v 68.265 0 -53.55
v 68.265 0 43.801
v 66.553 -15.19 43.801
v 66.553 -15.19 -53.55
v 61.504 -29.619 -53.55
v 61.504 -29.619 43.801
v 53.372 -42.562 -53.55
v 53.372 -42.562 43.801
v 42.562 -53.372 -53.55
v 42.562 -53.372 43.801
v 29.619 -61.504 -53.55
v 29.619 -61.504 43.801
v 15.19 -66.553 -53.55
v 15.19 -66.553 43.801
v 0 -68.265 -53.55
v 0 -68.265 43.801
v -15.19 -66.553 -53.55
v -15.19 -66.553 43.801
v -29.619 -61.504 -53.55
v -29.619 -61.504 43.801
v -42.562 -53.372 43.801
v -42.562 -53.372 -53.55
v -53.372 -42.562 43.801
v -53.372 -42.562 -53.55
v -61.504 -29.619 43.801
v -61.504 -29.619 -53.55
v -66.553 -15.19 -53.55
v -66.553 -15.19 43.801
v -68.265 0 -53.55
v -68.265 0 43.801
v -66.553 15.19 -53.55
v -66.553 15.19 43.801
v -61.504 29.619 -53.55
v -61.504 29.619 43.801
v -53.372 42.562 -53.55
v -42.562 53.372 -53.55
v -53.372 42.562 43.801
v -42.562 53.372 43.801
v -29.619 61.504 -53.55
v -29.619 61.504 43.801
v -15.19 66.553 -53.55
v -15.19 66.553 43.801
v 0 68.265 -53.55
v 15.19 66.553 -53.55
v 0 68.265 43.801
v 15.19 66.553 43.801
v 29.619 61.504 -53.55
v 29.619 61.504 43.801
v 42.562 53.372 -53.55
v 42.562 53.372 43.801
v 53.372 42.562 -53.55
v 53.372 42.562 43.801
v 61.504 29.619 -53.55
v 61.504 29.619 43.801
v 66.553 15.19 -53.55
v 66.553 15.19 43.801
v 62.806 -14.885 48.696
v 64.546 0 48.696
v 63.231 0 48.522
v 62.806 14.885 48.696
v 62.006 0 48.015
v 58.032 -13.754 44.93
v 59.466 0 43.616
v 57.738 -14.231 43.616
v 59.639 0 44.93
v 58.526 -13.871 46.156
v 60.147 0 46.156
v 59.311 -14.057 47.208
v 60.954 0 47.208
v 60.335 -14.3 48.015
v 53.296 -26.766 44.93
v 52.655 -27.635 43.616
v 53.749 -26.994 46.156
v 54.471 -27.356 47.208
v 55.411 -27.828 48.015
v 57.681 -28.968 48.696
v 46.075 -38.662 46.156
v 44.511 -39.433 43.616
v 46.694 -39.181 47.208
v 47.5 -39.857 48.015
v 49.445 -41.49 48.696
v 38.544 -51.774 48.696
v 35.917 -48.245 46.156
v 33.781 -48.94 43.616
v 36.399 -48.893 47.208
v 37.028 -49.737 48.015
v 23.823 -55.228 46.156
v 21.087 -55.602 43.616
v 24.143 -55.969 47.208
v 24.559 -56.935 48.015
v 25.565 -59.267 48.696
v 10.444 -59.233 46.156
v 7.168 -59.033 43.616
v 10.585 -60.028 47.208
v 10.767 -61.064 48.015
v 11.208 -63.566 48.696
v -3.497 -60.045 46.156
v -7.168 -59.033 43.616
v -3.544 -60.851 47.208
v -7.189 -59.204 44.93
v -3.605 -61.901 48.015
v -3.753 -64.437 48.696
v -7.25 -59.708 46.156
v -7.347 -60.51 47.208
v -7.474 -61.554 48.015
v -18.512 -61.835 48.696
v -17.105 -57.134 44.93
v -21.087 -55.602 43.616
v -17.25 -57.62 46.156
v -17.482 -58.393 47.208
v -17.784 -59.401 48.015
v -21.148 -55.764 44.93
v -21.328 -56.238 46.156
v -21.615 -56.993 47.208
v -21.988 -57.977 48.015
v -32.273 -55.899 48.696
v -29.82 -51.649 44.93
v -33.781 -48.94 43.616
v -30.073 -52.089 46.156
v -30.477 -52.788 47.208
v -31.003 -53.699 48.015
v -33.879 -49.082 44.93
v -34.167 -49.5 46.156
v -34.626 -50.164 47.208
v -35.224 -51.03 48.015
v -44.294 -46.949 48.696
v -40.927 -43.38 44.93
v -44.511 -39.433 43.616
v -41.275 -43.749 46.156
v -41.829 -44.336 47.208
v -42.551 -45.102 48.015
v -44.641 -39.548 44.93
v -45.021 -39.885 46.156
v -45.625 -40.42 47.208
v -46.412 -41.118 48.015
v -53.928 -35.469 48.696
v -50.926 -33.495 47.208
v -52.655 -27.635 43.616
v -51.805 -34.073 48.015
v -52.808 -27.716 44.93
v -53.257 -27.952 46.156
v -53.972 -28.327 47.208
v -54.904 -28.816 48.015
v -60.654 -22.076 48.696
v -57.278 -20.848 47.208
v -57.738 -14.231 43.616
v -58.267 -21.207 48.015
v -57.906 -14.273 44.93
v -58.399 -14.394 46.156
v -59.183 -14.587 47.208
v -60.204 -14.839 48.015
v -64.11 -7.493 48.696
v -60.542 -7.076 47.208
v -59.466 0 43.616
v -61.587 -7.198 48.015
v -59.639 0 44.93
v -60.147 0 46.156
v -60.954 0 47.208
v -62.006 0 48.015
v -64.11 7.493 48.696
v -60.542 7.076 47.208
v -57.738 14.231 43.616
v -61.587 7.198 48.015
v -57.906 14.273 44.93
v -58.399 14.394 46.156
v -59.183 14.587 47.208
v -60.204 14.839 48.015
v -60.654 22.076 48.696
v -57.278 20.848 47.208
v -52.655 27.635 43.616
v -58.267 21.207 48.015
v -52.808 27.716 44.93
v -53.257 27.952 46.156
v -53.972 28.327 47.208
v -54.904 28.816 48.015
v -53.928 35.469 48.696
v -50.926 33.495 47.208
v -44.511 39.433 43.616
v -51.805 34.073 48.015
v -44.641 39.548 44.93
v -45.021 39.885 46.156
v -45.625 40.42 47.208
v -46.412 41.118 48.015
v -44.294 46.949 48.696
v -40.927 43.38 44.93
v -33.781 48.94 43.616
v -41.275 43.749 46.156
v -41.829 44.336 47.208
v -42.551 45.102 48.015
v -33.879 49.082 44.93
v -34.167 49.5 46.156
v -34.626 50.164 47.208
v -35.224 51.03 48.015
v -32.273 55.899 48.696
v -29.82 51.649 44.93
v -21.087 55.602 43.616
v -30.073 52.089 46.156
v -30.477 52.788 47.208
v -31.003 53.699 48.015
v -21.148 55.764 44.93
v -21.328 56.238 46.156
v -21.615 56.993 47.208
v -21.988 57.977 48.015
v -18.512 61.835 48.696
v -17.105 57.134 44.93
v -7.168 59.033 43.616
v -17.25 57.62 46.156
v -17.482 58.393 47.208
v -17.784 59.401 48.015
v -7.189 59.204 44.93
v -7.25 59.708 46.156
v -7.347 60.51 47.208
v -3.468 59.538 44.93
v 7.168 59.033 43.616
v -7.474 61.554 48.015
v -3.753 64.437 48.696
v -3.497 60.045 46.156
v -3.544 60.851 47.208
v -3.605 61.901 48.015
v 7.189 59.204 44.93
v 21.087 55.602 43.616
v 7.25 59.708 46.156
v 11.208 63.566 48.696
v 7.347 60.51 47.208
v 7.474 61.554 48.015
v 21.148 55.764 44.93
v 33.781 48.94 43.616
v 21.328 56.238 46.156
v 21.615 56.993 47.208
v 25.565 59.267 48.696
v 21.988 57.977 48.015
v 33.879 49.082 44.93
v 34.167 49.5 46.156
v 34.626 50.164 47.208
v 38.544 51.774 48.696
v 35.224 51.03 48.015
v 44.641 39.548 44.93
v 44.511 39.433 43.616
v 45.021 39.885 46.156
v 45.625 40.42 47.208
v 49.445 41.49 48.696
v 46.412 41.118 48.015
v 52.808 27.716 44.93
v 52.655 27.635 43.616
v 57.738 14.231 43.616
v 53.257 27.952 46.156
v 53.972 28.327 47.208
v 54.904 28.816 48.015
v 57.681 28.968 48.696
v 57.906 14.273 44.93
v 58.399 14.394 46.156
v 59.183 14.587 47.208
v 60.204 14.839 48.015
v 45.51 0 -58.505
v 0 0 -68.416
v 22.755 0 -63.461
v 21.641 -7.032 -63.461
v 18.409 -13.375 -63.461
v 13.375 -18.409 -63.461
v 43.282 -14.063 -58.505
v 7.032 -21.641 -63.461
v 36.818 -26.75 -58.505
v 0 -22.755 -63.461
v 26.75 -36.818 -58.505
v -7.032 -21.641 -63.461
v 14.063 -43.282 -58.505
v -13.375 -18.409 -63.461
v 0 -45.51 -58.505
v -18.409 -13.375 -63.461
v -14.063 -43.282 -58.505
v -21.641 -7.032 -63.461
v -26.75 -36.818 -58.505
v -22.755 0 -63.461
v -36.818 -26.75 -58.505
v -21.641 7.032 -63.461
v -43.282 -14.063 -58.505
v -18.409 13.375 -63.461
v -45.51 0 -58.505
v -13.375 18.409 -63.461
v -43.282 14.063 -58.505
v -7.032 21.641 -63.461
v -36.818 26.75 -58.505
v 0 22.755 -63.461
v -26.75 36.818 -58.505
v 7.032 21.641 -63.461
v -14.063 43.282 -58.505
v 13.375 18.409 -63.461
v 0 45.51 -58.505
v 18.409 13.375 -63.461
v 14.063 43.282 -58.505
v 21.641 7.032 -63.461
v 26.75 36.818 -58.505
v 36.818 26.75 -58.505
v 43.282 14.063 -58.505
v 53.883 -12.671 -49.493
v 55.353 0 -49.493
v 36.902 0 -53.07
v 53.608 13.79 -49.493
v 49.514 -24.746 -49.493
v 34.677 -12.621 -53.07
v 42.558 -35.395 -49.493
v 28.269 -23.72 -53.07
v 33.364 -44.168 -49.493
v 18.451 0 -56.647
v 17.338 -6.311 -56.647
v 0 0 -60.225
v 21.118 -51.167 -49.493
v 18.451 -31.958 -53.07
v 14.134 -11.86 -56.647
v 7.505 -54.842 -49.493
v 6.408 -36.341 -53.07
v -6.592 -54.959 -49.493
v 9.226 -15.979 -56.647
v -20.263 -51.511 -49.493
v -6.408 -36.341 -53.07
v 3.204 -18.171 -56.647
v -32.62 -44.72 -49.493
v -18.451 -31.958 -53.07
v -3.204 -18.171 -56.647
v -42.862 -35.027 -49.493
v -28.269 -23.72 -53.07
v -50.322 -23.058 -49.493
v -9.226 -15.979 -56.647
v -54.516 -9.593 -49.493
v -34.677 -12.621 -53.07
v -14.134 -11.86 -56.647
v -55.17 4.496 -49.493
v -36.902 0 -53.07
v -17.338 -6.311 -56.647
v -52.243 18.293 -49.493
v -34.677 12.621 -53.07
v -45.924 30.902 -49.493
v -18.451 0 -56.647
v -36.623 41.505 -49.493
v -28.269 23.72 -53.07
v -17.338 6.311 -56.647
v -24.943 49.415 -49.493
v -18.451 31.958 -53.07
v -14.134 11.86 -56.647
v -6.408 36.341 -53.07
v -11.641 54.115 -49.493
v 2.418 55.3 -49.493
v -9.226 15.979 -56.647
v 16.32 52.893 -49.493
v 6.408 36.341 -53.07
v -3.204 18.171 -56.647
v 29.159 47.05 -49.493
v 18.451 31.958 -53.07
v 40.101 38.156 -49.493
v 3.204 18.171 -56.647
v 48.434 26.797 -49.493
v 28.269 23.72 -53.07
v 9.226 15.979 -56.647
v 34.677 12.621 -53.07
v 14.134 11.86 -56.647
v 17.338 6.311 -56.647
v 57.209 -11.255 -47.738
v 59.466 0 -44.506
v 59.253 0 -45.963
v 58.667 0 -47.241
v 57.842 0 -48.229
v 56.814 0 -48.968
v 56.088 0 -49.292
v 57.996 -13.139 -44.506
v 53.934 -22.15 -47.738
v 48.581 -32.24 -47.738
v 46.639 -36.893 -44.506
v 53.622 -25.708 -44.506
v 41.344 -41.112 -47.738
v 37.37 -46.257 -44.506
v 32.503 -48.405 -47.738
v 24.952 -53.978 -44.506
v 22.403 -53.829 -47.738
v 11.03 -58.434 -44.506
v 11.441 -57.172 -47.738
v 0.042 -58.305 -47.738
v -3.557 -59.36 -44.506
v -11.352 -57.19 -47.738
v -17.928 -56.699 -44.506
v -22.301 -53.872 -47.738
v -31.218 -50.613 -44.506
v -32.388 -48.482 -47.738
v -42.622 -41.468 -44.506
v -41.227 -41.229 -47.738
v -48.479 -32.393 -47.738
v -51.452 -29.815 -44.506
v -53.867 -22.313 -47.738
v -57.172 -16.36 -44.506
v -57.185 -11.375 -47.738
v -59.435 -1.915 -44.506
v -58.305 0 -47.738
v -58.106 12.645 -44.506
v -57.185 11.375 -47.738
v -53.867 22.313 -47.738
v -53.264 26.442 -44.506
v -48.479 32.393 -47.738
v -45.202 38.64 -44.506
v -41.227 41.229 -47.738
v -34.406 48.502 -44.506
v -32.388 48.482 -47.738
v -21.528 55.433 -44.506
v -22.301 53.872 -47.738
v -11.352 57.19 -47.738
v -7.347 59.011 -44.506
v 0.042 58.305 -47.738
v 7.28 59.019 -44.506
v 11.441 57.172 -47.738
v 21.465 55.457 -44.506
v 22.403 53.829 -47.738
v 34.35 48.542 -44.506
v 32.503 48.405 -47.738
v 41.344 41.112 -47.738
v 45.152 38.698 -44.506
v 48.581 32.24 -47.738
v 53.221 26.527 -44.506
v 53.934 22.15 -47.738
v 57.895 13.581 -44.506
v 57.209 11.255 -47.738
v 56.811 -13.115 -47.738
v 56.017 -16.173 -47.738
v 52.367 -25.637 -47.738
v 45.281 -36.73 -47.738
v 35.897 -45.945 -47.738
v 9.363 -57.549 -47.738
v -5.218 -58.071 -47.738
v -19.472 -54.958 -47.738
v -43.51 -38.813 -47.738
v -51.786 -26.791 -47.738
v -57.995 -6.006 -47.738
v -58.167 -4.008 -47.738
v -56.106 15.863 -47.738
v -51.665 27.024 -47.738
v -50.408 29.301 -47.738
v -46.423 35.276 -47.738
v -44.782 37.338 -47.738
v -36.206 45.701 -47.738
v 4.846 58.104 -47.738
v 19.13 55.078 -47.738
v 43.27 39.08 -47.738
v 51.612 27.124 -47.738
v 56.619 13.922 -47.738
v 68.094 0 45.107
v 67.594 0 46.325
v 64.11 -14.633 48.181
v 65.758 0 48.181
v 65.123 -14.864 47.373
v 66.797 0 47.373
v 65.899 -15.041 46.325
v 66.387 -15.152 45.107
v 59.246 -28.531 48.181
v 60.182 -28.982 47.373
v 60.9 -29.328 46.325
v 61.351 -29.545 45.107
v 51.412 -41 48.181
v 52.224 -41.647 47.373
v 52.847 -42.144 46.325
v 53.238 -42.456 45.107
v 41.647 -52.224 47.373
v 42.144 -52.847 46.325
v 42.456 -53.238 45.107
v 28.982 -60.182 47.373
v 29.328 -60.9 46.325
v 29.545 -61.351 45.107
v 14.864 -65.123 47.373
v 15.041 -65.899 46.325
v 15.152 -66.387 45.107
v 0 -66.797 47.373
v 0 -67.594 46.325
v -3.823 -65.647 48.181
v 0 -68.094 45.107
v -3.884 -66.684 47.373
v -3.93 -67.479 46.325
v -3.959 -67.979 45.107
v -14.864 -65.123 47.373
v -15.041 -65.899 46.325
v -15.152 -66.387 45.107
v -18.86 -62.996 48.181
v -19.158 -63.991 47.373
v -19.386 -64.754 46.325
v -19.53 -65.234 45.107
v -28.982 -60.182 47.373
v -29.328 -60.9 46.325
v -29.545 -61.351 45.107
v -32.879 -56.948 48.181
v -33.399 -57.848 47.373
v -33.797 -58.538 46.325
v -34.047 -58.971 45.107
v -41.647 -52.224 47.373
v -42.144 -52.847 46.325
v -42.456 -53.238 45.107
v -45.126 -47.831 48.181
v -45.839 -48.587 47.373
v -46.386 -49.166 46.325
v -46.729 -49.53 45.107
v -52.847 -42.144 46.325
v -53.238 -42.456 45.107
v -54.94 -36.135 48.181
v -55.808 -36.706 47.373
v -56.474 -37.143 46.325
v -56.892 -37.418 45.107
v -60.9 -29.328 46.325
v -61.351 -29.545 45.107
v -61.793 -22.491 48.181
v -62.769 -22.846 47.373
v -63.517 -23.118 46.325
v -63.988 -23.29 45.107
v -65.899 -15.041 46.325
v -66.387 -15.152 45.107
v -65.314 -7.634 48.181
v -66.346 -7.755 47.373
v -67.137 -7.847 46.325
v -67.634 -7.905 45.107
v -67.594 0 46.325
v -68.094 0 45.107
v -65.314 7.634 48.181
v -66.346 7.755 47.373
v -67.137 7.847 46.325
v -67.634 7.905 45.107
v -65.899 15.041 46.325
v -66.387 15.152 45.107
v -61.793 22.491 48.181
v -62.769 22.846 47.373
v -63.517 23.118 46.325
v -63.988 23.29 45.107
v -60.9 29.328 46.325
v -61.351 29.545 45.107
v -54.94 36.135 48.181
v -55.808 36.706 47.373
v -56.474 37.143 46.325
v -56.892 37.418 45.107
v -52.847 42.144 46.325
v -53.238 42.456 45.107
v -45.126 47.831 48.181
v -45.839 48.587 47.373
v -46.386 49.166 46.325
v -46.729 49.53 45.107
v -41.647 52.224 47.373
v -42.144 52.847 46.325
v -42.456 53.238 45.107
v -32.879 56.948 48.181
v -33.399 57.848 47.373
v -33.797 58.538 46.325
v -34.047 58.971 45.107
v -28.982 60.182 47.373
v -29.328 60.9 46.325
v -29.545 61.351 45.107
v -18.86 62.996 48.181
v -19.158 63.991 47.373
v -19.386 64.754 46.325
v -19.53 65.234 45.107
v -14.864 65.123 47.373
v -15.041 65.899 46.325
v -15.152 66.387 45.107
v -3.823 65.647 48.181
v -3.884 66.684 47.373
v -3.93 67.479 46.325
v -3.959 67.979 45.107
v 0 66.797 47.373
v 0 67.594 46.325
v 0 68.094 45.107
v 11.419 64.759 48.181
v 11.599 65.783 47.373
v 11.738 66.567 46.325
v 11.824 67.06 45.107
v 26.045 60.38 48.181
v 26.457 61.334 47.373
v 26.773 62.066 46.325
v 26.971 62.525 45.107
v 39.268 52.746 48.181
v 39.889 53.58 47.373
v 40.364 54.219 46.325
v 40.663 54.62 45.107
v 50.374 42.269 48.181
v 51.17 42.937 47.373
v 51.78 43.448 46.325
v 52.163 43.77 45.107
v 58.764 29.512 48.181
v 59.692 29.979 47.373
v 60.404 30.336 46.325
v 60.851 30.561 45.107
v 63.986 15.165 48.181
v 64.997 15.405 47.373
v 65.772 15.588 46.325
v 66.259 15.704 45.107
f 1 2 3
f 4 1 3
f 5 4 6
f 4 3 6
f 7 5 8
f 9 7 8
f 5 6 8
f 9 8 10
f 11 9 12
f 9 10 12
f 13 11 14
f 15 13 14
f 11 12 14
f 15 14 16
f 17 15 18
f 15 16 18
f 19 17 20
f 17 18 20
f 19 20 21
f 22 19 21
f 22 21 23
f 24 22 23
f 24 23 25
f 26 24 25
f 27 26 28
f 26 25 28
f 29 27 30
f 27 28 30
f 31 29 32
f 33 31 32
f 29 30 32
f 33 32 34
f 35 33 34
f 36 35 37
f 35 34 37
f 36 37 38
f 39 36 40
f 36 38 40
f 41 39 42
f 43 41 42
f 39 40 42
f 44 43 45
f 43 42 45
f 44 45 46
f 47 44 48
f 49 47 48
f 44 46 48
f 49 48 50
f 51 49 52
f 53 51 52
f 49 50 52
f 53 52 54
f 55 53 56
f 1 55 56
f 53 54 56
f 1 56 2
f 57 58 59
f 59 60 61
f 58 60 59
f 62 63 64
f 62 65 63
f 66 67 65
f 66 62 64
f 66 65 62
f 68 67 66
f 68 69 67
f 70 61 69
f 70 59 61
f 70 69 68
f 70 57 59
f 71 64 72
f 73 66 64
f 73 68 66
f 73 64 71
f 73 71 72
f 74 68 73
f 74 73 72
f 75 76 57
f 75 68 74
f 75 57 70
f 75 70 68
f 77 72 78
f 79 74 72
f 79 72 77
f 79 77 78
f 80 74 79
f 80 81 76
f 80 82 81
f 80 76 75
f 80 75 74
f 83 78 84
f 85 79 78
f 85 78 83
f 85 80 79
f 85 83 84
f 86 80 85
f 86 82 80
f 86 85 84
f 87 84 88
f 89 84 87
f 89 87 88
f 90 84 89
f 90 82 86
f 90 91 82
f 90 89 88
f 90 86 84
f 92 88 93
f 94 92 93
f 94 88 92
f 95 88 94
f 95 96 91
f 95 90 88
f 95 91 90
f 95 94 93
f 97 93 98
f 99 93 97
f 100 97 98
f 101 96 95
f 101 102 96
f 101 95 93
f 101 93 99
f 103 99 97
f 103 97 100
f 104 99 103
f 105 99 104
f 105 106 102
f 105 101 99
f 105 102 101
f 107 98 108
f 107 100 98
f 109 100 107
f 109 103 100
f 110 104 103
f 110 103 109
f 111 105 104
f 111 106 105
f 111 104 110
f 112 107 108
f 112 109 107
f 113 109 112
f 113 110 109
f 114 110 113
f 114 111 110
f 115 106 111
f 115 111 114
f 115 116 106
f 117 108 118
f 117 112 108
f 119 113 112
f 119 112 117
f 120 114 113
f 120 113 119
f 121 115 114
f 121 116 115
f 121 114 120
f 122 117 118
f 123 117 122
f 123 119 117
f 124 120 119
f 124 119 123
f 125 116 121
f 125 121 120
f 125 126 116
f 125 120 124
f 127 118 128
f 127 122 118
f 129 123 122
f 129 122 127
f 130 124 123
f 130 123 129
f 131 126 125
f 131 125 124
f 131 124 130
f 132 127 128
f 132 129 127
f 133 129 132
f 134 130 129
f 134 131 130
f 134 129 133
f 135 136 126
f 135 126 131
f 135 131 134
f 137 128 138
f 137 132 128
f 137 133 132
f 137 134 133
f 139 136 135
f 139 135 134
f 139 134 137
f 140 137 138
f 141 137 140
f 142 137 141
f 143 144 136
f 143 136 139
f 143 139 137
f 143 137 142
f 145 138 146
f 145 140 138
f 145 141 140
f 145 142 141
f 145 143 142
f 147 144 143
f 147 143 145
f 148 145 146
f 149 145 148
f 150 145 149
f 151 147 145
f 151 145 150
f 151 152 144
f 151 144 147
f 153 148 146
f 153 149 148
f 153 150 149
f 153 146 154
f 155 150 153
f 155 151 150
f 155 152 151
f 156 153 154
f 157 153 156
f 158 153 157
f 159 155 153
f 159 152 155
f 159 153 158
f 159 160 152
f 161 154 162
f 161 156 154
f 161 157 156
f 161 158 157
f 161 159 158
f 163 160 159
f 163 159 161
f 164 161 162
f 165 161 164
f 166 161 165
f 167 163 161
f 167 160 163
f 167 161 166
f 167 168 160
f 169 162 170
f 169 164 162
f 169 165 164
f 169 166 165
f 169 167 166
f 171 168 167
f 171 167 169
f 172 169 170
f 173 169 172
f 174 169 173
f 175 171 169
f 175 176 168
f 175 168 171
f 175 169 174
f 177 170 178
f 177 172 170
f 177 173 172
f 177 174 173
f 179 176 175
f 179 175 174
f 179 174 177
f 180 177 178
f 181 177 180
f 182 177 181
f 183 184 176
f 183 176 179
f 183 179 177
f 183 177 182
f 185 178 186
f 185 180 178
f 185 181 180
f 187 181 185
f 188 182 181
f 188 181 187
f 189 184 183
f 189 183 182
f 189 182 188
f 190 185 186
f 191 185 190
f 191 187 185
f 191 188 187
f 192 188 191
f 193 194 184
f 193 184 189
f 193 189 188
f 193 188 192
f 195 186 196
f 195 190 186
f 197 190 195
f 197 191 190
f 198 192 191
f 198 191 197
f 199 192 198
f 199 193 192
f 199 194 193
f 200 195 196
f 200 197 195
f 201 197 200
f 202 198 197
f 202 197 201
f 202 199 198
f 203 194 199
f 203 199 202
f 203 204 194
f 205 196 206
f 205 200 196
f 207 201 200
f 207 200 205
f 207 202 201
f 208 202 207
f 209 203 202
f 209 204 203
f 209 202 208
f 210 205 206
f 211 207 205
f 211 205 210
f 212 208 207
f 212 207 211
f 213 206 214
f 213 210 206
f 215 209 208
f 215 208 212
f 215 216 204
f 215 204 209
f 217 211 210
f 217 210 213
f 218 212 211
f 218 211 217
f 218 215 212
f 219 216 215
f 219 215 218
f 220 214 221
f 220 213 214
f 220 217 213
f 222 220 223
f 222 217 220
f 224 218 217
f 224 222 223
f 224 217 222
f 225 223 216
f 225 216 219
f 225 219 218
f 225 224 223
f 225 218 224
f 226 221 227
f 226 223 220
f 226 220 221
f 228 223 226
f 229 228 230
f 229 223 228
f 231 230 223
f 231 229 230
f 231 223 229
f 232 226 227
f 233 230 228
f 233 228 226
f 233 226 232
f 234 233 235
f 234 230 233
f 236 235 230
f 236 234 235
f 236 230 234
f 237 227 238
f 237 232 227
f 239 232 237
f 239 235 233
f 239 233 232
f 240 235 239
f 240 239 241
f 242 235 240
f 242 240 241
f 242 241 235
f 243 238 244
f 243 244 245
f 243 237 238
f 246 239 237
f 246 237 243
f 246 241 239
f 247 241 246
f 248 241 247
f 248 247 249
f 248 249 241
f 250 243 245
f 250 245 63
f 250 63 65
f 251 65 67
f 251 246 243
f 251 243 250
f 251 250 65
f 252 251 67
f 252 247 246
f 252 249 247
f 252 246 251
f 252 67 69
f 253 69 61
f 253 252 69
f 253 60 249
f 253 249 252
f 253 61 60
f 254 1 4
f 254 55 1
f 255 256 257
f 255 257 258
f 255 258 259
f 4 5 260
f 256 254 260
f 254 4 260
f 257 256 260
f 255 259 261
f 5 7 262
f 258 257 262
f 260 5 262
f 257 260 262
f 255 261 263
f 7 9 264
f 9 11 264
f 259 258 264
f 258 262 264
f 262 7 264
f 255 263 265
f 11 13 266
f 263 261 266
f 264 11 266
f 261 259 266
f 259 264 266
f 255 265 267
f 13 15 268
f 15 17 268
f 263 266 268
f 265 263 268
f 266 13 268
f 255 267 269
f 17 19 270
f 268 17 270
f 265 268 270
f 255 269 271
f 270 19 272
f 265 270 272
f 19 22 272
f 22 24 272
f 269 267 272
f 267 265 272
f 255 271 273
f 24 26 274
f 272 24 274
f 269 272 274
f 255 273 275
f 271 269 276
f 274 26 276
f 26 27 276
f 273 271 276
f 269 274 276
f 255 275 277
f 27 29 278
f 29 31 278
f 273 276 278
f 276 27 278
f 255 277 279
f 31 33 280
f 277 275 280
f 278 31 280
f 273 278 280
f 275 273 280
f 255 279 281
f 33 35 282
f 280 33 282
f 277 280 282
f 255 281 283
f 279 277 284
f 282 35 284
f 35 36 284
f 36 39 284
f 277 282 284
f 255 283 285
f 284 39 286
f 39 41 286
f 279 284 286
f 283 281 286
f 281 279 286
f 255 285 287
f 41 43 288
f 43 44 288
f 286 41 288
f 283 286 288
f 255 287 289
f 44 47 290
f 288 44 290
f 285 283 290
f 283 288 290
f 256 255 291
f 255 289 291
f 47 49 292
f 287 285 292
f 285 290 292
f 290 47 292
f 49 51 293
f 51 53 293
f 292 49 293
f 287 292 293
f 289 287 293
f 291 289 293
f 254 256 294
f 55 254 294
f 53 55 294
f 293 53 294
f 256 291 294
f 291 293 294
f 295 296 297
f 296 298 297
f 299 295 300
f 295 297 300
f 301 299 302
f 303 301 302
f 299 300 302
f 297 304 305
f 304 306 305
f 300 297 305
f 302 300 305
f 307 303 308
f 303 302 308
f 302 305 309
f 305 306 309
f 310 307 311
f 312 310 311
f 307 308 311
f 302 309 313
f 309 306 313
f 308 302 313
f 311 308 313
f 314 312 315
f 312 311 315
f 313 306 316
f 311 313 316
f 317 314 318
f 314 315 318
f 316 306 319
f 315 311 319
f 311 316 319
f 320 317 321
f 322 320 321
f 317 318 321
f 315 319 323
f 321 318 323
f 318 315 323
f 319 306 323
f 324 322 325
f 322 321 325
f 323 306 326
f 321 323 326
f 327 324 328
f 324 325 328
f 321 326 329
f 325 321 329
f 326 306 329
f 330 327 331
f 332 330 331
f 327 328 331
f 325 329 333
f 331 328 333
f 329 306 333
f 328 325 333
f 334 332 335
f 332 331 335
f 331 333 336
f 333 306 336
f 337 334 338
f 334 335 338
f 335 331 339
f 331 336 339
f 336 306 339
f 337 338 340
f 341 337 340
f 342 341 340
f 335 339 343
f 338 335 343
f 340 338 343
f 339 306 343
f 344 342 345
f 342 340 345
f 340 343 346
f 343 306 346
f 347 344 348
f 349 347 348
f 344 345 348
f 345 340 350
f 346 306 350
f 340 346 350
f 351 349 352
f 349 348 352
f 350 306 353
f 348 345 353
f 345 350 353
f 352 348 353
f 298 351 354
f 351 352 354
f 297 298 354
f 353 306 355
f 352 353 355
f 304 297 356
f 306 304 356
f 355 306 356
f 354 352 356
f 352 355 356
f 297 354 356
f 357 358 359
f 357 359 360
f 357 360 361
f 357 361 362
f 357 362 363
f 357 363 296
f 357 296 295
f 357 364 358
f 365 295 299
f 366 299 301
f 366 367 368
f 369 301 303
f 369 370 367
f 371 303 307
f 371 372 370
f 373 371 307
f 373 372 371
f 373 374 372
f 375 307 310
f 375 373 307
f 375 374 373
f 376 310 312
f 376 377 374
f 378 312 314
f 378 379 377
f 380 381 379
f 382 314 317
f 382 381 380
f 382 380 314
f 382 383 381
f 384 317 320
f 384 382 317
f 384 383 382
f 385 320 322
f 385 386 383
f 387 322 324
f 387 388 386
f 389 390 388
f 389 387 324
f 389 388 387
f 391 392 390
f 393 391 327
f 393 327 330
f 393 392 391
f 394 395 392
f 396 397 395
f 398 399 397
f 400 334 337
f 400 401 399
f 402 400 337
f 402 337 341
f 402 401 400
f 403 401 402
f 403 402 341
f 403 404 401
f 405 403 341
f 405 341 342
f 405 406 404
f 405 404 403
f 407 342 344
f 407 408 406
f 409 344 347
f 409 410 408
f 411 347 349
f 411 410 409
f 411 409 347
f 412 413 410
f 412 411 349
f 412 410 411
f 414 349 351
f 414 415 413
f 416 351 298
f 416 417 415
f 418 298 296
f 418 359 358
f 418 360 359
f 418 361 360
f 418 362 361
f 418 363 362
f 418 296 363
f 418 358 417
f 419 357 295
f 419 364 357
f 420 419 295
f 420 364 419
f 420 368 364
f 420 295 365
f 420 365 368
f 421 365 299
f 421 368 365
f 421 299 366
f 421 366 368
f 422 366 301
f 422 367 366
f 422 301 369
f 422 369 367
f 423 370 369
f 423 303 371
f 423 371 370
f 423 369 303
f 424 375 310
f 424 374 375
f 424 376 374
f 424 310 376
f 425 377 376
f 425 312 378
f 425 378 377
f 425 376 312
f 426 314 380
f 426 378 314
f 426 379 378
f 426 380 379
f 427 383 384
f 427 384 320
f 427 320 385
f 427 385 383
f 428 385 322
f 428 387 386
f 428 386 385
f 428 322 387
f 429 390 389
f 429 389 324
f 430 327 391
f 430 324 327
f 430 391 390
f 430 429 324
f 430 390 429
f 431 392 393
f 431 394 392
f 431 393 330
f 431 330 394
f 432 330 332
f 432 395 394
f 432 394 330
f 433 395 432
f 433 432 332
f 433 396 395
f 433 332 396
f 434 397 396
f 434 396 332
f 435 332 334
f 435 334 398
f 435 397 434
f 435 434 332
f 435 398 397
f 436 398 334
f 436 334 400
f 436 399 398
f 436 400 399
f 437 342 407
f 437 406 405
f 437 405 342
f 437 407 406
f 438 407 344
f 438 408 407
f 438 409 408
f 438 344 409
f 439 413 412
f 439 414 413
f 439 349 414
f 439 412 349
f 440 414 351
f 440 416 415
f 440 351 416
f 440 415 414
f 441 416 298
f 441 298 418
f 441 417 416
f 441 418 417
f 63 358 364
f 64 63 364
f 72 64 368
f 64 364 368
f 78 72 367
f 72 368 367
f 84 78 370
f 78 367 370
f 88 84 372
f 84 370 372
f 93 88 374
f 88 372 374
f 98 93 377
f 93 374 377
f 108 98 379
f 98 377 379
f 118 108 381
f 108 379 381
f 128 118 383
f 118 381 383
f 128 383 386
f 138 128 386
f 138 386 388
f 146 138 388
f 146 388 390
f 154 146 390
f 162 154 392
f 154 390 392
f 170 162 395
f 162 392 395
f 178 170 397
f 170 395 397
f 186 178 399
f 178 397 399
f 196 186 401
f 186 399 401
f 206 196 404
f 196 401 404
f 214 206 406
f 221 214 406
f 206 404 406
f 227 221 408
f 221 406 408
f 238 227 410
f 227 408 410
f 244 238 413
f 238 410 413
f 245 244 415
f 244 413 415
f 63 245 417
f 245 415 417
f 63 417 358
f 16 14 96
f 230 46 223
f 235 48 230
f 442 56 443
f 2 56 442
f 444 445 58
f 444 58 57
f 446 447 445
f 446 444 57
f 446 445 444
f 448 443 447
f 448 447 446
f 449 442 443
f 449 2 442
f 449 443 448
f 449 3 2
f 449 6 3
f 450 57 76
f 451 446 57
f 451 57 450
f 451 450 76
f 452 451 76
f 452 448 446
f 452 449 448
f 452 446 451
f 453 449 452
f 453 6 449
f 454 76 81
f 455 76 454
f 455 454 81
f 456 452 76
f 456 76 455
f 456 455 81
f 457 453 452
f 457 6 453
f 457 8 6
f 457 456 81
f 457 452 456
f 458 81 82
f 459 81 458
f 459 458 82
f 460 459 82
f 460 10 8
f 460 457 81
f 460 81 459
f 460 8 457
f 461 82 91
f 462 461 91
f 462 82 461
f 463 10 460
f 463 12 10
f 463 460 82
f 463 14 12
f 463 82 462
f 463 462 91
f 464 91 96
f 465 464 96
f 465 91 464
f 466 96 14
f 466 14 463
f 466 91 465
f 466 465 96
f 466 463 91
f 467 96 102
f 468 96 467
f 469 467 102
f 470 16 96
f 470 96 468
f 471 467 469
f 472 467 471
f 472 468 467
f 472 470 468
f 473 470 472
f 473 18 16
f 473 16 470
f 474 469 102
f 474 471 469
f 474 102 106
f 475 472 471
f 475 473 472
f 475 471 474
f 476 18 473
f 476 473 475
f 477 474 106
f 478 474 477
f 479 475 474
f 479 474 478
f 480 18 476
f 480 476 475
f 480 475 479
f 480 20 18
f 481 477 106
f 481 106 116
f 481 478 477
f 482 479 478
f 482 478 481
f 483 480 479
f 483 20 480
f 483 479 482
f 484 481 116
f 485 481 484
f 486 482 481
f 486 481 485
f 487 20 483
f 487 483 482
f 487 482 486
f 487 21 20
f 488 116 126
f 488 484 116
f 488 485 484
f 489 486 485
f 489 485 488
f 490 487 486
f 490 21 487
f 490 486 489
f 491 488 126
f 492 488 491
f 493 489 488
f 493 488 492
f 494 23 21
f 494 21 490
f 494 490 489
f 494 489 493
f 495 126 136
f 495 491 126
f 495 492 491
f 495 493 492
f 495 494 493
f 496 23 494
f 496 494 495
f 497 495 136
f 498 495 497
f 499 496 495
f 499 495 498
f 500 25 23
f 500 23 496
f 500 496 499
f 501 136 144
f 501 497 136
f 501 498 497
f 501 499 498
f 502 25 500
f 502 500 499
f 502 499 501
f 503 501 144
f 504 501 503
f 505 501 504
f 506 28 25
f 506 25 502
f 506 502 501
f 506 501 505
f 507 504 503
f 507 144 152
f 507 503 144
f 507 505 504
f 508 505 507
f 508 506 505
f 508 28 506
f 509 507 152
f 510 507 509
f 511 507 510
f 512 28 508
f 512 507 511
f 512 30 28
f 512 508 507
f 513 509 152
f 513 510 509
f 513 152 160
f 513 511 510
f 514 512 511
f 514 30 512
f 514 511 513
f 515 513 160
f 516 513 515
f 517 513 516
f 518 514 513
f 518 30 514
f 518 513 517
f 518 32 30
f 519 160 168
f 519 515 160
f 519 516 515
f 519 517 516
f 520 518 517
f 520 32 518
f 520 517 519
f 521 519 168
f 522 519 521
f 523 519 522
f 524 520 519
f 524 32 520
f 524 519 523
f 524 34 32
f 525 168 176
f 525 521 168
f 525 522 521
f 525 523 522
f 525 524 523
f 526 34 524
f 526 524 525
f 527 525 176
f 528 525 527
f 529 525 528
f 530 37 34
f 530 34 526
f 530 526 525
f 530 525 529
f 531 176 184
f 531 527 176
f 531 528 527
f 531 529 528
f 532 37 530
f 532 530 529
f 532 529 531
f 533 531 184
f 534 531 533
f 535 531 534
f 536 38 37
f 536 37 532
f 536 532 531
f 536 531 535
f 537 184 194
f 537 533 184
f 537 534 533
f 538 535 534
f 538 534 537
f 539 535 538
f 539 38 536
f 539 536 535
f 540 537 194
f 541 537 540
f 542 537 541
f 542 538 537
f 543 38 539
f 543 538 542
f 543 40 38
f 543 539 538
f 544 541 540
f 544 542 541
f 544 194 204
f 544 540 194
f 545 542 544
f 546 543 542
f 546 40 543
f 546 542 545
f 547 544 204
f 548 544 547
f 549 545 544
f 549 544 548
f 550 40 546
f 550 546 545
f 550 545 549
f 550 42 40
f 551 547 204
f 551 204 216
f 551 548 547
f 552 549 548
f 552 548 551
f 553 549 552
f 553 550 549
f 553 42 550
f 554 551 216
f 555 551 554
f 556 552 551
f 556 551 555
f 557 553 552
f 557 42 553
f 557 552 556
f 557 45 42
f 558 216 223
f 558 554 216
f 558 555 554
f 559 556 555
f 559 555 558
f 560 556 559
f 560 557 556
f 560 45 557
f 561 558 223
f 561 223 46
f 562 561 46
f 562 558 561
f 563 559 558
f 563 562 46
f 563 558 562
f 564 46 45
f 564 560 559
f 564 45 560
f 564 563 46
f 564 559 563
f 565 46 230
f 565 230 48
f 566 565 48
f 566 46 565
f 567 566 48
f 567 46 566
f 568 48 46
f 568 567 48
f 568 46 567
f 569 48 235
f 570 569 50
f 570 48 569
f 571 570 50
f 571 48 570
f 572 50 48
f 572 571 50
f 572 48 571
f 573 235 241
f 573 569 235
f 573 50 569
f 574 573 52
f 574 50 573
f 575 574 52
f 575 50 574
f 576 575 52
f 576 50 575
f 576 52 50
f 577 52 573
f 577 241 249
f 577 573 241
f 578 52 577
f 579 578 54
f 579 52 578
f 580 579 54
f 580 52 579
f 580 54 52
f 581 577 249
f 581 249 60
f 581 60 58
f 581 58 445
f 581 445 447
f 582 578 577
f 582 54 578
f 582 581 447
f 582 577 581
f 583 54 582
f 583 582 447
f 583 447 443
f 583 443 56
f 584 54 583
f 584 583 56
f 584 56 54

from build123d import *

# Parameters (mm, degrees)
F2_R = 5.08
F3_R = 5.08


# Not quite as in the source:
# - a fillet or chamfer that OpenCascade refuses, or shapes differently, is made with other operations: its cross-section is extruded or revolved along the edge and cut away or added


with BuildPart() as f1:
    # F0 (on Front) → F1 (revolve)
    with BuildSketch(Plane.XZ):
        Polygon((68.2647973299, 48.6955605447), (59.4662241638, 48.6955605447), (59.4662241638, -48.6955568194), (0, -60.2247230709), (0, -68.4164986014), (68.2647973299, -53.5499453545), align=None)
    revolve(axis=Axis((0, 0, 0.9102020413), (0, 0, -1)))

    # F2
    f2_edges = [f1.edges().sort_by_distance(p)[0] for p in [
        (-59.466224, 0, -48.695557),
        (29.733112, 0, -54.46014),
    ]]
    fillet(f2_edges, radius=F2_R)

    # F3
    f3_edges = [f1.edges().sort_by_distance(p)[0] for p in [
        (-59.466224, 0, 48.695561),
    ]]
    fillet(f3_edges, radius=F3_R)

    # F4: fillet of radius 5.08 on 1 edges, made by hand

    # F4_s1 → F4_t2 (revolve, cut)
    with BuildSketch(Plane.XZ):
        with BuildLine():
            ThreePointArc((64.5462241638, 48.6955605447), (67.2296983371, 46.8746892895), (68.2647973299, 43.8013888093))
            Line((68.2647973299, 43.8013888093), (68.2647973299, 48.6955605447))
            Line((68.2647973299, 48.6955605447), (64.5462241638, 48.6955605447))
        make_face()
    revolve(axis=Axis((0, 0, 48.6955605447), (0, 0, -1)), mode=Mode.SUBTRACT)


solid = f1.part
